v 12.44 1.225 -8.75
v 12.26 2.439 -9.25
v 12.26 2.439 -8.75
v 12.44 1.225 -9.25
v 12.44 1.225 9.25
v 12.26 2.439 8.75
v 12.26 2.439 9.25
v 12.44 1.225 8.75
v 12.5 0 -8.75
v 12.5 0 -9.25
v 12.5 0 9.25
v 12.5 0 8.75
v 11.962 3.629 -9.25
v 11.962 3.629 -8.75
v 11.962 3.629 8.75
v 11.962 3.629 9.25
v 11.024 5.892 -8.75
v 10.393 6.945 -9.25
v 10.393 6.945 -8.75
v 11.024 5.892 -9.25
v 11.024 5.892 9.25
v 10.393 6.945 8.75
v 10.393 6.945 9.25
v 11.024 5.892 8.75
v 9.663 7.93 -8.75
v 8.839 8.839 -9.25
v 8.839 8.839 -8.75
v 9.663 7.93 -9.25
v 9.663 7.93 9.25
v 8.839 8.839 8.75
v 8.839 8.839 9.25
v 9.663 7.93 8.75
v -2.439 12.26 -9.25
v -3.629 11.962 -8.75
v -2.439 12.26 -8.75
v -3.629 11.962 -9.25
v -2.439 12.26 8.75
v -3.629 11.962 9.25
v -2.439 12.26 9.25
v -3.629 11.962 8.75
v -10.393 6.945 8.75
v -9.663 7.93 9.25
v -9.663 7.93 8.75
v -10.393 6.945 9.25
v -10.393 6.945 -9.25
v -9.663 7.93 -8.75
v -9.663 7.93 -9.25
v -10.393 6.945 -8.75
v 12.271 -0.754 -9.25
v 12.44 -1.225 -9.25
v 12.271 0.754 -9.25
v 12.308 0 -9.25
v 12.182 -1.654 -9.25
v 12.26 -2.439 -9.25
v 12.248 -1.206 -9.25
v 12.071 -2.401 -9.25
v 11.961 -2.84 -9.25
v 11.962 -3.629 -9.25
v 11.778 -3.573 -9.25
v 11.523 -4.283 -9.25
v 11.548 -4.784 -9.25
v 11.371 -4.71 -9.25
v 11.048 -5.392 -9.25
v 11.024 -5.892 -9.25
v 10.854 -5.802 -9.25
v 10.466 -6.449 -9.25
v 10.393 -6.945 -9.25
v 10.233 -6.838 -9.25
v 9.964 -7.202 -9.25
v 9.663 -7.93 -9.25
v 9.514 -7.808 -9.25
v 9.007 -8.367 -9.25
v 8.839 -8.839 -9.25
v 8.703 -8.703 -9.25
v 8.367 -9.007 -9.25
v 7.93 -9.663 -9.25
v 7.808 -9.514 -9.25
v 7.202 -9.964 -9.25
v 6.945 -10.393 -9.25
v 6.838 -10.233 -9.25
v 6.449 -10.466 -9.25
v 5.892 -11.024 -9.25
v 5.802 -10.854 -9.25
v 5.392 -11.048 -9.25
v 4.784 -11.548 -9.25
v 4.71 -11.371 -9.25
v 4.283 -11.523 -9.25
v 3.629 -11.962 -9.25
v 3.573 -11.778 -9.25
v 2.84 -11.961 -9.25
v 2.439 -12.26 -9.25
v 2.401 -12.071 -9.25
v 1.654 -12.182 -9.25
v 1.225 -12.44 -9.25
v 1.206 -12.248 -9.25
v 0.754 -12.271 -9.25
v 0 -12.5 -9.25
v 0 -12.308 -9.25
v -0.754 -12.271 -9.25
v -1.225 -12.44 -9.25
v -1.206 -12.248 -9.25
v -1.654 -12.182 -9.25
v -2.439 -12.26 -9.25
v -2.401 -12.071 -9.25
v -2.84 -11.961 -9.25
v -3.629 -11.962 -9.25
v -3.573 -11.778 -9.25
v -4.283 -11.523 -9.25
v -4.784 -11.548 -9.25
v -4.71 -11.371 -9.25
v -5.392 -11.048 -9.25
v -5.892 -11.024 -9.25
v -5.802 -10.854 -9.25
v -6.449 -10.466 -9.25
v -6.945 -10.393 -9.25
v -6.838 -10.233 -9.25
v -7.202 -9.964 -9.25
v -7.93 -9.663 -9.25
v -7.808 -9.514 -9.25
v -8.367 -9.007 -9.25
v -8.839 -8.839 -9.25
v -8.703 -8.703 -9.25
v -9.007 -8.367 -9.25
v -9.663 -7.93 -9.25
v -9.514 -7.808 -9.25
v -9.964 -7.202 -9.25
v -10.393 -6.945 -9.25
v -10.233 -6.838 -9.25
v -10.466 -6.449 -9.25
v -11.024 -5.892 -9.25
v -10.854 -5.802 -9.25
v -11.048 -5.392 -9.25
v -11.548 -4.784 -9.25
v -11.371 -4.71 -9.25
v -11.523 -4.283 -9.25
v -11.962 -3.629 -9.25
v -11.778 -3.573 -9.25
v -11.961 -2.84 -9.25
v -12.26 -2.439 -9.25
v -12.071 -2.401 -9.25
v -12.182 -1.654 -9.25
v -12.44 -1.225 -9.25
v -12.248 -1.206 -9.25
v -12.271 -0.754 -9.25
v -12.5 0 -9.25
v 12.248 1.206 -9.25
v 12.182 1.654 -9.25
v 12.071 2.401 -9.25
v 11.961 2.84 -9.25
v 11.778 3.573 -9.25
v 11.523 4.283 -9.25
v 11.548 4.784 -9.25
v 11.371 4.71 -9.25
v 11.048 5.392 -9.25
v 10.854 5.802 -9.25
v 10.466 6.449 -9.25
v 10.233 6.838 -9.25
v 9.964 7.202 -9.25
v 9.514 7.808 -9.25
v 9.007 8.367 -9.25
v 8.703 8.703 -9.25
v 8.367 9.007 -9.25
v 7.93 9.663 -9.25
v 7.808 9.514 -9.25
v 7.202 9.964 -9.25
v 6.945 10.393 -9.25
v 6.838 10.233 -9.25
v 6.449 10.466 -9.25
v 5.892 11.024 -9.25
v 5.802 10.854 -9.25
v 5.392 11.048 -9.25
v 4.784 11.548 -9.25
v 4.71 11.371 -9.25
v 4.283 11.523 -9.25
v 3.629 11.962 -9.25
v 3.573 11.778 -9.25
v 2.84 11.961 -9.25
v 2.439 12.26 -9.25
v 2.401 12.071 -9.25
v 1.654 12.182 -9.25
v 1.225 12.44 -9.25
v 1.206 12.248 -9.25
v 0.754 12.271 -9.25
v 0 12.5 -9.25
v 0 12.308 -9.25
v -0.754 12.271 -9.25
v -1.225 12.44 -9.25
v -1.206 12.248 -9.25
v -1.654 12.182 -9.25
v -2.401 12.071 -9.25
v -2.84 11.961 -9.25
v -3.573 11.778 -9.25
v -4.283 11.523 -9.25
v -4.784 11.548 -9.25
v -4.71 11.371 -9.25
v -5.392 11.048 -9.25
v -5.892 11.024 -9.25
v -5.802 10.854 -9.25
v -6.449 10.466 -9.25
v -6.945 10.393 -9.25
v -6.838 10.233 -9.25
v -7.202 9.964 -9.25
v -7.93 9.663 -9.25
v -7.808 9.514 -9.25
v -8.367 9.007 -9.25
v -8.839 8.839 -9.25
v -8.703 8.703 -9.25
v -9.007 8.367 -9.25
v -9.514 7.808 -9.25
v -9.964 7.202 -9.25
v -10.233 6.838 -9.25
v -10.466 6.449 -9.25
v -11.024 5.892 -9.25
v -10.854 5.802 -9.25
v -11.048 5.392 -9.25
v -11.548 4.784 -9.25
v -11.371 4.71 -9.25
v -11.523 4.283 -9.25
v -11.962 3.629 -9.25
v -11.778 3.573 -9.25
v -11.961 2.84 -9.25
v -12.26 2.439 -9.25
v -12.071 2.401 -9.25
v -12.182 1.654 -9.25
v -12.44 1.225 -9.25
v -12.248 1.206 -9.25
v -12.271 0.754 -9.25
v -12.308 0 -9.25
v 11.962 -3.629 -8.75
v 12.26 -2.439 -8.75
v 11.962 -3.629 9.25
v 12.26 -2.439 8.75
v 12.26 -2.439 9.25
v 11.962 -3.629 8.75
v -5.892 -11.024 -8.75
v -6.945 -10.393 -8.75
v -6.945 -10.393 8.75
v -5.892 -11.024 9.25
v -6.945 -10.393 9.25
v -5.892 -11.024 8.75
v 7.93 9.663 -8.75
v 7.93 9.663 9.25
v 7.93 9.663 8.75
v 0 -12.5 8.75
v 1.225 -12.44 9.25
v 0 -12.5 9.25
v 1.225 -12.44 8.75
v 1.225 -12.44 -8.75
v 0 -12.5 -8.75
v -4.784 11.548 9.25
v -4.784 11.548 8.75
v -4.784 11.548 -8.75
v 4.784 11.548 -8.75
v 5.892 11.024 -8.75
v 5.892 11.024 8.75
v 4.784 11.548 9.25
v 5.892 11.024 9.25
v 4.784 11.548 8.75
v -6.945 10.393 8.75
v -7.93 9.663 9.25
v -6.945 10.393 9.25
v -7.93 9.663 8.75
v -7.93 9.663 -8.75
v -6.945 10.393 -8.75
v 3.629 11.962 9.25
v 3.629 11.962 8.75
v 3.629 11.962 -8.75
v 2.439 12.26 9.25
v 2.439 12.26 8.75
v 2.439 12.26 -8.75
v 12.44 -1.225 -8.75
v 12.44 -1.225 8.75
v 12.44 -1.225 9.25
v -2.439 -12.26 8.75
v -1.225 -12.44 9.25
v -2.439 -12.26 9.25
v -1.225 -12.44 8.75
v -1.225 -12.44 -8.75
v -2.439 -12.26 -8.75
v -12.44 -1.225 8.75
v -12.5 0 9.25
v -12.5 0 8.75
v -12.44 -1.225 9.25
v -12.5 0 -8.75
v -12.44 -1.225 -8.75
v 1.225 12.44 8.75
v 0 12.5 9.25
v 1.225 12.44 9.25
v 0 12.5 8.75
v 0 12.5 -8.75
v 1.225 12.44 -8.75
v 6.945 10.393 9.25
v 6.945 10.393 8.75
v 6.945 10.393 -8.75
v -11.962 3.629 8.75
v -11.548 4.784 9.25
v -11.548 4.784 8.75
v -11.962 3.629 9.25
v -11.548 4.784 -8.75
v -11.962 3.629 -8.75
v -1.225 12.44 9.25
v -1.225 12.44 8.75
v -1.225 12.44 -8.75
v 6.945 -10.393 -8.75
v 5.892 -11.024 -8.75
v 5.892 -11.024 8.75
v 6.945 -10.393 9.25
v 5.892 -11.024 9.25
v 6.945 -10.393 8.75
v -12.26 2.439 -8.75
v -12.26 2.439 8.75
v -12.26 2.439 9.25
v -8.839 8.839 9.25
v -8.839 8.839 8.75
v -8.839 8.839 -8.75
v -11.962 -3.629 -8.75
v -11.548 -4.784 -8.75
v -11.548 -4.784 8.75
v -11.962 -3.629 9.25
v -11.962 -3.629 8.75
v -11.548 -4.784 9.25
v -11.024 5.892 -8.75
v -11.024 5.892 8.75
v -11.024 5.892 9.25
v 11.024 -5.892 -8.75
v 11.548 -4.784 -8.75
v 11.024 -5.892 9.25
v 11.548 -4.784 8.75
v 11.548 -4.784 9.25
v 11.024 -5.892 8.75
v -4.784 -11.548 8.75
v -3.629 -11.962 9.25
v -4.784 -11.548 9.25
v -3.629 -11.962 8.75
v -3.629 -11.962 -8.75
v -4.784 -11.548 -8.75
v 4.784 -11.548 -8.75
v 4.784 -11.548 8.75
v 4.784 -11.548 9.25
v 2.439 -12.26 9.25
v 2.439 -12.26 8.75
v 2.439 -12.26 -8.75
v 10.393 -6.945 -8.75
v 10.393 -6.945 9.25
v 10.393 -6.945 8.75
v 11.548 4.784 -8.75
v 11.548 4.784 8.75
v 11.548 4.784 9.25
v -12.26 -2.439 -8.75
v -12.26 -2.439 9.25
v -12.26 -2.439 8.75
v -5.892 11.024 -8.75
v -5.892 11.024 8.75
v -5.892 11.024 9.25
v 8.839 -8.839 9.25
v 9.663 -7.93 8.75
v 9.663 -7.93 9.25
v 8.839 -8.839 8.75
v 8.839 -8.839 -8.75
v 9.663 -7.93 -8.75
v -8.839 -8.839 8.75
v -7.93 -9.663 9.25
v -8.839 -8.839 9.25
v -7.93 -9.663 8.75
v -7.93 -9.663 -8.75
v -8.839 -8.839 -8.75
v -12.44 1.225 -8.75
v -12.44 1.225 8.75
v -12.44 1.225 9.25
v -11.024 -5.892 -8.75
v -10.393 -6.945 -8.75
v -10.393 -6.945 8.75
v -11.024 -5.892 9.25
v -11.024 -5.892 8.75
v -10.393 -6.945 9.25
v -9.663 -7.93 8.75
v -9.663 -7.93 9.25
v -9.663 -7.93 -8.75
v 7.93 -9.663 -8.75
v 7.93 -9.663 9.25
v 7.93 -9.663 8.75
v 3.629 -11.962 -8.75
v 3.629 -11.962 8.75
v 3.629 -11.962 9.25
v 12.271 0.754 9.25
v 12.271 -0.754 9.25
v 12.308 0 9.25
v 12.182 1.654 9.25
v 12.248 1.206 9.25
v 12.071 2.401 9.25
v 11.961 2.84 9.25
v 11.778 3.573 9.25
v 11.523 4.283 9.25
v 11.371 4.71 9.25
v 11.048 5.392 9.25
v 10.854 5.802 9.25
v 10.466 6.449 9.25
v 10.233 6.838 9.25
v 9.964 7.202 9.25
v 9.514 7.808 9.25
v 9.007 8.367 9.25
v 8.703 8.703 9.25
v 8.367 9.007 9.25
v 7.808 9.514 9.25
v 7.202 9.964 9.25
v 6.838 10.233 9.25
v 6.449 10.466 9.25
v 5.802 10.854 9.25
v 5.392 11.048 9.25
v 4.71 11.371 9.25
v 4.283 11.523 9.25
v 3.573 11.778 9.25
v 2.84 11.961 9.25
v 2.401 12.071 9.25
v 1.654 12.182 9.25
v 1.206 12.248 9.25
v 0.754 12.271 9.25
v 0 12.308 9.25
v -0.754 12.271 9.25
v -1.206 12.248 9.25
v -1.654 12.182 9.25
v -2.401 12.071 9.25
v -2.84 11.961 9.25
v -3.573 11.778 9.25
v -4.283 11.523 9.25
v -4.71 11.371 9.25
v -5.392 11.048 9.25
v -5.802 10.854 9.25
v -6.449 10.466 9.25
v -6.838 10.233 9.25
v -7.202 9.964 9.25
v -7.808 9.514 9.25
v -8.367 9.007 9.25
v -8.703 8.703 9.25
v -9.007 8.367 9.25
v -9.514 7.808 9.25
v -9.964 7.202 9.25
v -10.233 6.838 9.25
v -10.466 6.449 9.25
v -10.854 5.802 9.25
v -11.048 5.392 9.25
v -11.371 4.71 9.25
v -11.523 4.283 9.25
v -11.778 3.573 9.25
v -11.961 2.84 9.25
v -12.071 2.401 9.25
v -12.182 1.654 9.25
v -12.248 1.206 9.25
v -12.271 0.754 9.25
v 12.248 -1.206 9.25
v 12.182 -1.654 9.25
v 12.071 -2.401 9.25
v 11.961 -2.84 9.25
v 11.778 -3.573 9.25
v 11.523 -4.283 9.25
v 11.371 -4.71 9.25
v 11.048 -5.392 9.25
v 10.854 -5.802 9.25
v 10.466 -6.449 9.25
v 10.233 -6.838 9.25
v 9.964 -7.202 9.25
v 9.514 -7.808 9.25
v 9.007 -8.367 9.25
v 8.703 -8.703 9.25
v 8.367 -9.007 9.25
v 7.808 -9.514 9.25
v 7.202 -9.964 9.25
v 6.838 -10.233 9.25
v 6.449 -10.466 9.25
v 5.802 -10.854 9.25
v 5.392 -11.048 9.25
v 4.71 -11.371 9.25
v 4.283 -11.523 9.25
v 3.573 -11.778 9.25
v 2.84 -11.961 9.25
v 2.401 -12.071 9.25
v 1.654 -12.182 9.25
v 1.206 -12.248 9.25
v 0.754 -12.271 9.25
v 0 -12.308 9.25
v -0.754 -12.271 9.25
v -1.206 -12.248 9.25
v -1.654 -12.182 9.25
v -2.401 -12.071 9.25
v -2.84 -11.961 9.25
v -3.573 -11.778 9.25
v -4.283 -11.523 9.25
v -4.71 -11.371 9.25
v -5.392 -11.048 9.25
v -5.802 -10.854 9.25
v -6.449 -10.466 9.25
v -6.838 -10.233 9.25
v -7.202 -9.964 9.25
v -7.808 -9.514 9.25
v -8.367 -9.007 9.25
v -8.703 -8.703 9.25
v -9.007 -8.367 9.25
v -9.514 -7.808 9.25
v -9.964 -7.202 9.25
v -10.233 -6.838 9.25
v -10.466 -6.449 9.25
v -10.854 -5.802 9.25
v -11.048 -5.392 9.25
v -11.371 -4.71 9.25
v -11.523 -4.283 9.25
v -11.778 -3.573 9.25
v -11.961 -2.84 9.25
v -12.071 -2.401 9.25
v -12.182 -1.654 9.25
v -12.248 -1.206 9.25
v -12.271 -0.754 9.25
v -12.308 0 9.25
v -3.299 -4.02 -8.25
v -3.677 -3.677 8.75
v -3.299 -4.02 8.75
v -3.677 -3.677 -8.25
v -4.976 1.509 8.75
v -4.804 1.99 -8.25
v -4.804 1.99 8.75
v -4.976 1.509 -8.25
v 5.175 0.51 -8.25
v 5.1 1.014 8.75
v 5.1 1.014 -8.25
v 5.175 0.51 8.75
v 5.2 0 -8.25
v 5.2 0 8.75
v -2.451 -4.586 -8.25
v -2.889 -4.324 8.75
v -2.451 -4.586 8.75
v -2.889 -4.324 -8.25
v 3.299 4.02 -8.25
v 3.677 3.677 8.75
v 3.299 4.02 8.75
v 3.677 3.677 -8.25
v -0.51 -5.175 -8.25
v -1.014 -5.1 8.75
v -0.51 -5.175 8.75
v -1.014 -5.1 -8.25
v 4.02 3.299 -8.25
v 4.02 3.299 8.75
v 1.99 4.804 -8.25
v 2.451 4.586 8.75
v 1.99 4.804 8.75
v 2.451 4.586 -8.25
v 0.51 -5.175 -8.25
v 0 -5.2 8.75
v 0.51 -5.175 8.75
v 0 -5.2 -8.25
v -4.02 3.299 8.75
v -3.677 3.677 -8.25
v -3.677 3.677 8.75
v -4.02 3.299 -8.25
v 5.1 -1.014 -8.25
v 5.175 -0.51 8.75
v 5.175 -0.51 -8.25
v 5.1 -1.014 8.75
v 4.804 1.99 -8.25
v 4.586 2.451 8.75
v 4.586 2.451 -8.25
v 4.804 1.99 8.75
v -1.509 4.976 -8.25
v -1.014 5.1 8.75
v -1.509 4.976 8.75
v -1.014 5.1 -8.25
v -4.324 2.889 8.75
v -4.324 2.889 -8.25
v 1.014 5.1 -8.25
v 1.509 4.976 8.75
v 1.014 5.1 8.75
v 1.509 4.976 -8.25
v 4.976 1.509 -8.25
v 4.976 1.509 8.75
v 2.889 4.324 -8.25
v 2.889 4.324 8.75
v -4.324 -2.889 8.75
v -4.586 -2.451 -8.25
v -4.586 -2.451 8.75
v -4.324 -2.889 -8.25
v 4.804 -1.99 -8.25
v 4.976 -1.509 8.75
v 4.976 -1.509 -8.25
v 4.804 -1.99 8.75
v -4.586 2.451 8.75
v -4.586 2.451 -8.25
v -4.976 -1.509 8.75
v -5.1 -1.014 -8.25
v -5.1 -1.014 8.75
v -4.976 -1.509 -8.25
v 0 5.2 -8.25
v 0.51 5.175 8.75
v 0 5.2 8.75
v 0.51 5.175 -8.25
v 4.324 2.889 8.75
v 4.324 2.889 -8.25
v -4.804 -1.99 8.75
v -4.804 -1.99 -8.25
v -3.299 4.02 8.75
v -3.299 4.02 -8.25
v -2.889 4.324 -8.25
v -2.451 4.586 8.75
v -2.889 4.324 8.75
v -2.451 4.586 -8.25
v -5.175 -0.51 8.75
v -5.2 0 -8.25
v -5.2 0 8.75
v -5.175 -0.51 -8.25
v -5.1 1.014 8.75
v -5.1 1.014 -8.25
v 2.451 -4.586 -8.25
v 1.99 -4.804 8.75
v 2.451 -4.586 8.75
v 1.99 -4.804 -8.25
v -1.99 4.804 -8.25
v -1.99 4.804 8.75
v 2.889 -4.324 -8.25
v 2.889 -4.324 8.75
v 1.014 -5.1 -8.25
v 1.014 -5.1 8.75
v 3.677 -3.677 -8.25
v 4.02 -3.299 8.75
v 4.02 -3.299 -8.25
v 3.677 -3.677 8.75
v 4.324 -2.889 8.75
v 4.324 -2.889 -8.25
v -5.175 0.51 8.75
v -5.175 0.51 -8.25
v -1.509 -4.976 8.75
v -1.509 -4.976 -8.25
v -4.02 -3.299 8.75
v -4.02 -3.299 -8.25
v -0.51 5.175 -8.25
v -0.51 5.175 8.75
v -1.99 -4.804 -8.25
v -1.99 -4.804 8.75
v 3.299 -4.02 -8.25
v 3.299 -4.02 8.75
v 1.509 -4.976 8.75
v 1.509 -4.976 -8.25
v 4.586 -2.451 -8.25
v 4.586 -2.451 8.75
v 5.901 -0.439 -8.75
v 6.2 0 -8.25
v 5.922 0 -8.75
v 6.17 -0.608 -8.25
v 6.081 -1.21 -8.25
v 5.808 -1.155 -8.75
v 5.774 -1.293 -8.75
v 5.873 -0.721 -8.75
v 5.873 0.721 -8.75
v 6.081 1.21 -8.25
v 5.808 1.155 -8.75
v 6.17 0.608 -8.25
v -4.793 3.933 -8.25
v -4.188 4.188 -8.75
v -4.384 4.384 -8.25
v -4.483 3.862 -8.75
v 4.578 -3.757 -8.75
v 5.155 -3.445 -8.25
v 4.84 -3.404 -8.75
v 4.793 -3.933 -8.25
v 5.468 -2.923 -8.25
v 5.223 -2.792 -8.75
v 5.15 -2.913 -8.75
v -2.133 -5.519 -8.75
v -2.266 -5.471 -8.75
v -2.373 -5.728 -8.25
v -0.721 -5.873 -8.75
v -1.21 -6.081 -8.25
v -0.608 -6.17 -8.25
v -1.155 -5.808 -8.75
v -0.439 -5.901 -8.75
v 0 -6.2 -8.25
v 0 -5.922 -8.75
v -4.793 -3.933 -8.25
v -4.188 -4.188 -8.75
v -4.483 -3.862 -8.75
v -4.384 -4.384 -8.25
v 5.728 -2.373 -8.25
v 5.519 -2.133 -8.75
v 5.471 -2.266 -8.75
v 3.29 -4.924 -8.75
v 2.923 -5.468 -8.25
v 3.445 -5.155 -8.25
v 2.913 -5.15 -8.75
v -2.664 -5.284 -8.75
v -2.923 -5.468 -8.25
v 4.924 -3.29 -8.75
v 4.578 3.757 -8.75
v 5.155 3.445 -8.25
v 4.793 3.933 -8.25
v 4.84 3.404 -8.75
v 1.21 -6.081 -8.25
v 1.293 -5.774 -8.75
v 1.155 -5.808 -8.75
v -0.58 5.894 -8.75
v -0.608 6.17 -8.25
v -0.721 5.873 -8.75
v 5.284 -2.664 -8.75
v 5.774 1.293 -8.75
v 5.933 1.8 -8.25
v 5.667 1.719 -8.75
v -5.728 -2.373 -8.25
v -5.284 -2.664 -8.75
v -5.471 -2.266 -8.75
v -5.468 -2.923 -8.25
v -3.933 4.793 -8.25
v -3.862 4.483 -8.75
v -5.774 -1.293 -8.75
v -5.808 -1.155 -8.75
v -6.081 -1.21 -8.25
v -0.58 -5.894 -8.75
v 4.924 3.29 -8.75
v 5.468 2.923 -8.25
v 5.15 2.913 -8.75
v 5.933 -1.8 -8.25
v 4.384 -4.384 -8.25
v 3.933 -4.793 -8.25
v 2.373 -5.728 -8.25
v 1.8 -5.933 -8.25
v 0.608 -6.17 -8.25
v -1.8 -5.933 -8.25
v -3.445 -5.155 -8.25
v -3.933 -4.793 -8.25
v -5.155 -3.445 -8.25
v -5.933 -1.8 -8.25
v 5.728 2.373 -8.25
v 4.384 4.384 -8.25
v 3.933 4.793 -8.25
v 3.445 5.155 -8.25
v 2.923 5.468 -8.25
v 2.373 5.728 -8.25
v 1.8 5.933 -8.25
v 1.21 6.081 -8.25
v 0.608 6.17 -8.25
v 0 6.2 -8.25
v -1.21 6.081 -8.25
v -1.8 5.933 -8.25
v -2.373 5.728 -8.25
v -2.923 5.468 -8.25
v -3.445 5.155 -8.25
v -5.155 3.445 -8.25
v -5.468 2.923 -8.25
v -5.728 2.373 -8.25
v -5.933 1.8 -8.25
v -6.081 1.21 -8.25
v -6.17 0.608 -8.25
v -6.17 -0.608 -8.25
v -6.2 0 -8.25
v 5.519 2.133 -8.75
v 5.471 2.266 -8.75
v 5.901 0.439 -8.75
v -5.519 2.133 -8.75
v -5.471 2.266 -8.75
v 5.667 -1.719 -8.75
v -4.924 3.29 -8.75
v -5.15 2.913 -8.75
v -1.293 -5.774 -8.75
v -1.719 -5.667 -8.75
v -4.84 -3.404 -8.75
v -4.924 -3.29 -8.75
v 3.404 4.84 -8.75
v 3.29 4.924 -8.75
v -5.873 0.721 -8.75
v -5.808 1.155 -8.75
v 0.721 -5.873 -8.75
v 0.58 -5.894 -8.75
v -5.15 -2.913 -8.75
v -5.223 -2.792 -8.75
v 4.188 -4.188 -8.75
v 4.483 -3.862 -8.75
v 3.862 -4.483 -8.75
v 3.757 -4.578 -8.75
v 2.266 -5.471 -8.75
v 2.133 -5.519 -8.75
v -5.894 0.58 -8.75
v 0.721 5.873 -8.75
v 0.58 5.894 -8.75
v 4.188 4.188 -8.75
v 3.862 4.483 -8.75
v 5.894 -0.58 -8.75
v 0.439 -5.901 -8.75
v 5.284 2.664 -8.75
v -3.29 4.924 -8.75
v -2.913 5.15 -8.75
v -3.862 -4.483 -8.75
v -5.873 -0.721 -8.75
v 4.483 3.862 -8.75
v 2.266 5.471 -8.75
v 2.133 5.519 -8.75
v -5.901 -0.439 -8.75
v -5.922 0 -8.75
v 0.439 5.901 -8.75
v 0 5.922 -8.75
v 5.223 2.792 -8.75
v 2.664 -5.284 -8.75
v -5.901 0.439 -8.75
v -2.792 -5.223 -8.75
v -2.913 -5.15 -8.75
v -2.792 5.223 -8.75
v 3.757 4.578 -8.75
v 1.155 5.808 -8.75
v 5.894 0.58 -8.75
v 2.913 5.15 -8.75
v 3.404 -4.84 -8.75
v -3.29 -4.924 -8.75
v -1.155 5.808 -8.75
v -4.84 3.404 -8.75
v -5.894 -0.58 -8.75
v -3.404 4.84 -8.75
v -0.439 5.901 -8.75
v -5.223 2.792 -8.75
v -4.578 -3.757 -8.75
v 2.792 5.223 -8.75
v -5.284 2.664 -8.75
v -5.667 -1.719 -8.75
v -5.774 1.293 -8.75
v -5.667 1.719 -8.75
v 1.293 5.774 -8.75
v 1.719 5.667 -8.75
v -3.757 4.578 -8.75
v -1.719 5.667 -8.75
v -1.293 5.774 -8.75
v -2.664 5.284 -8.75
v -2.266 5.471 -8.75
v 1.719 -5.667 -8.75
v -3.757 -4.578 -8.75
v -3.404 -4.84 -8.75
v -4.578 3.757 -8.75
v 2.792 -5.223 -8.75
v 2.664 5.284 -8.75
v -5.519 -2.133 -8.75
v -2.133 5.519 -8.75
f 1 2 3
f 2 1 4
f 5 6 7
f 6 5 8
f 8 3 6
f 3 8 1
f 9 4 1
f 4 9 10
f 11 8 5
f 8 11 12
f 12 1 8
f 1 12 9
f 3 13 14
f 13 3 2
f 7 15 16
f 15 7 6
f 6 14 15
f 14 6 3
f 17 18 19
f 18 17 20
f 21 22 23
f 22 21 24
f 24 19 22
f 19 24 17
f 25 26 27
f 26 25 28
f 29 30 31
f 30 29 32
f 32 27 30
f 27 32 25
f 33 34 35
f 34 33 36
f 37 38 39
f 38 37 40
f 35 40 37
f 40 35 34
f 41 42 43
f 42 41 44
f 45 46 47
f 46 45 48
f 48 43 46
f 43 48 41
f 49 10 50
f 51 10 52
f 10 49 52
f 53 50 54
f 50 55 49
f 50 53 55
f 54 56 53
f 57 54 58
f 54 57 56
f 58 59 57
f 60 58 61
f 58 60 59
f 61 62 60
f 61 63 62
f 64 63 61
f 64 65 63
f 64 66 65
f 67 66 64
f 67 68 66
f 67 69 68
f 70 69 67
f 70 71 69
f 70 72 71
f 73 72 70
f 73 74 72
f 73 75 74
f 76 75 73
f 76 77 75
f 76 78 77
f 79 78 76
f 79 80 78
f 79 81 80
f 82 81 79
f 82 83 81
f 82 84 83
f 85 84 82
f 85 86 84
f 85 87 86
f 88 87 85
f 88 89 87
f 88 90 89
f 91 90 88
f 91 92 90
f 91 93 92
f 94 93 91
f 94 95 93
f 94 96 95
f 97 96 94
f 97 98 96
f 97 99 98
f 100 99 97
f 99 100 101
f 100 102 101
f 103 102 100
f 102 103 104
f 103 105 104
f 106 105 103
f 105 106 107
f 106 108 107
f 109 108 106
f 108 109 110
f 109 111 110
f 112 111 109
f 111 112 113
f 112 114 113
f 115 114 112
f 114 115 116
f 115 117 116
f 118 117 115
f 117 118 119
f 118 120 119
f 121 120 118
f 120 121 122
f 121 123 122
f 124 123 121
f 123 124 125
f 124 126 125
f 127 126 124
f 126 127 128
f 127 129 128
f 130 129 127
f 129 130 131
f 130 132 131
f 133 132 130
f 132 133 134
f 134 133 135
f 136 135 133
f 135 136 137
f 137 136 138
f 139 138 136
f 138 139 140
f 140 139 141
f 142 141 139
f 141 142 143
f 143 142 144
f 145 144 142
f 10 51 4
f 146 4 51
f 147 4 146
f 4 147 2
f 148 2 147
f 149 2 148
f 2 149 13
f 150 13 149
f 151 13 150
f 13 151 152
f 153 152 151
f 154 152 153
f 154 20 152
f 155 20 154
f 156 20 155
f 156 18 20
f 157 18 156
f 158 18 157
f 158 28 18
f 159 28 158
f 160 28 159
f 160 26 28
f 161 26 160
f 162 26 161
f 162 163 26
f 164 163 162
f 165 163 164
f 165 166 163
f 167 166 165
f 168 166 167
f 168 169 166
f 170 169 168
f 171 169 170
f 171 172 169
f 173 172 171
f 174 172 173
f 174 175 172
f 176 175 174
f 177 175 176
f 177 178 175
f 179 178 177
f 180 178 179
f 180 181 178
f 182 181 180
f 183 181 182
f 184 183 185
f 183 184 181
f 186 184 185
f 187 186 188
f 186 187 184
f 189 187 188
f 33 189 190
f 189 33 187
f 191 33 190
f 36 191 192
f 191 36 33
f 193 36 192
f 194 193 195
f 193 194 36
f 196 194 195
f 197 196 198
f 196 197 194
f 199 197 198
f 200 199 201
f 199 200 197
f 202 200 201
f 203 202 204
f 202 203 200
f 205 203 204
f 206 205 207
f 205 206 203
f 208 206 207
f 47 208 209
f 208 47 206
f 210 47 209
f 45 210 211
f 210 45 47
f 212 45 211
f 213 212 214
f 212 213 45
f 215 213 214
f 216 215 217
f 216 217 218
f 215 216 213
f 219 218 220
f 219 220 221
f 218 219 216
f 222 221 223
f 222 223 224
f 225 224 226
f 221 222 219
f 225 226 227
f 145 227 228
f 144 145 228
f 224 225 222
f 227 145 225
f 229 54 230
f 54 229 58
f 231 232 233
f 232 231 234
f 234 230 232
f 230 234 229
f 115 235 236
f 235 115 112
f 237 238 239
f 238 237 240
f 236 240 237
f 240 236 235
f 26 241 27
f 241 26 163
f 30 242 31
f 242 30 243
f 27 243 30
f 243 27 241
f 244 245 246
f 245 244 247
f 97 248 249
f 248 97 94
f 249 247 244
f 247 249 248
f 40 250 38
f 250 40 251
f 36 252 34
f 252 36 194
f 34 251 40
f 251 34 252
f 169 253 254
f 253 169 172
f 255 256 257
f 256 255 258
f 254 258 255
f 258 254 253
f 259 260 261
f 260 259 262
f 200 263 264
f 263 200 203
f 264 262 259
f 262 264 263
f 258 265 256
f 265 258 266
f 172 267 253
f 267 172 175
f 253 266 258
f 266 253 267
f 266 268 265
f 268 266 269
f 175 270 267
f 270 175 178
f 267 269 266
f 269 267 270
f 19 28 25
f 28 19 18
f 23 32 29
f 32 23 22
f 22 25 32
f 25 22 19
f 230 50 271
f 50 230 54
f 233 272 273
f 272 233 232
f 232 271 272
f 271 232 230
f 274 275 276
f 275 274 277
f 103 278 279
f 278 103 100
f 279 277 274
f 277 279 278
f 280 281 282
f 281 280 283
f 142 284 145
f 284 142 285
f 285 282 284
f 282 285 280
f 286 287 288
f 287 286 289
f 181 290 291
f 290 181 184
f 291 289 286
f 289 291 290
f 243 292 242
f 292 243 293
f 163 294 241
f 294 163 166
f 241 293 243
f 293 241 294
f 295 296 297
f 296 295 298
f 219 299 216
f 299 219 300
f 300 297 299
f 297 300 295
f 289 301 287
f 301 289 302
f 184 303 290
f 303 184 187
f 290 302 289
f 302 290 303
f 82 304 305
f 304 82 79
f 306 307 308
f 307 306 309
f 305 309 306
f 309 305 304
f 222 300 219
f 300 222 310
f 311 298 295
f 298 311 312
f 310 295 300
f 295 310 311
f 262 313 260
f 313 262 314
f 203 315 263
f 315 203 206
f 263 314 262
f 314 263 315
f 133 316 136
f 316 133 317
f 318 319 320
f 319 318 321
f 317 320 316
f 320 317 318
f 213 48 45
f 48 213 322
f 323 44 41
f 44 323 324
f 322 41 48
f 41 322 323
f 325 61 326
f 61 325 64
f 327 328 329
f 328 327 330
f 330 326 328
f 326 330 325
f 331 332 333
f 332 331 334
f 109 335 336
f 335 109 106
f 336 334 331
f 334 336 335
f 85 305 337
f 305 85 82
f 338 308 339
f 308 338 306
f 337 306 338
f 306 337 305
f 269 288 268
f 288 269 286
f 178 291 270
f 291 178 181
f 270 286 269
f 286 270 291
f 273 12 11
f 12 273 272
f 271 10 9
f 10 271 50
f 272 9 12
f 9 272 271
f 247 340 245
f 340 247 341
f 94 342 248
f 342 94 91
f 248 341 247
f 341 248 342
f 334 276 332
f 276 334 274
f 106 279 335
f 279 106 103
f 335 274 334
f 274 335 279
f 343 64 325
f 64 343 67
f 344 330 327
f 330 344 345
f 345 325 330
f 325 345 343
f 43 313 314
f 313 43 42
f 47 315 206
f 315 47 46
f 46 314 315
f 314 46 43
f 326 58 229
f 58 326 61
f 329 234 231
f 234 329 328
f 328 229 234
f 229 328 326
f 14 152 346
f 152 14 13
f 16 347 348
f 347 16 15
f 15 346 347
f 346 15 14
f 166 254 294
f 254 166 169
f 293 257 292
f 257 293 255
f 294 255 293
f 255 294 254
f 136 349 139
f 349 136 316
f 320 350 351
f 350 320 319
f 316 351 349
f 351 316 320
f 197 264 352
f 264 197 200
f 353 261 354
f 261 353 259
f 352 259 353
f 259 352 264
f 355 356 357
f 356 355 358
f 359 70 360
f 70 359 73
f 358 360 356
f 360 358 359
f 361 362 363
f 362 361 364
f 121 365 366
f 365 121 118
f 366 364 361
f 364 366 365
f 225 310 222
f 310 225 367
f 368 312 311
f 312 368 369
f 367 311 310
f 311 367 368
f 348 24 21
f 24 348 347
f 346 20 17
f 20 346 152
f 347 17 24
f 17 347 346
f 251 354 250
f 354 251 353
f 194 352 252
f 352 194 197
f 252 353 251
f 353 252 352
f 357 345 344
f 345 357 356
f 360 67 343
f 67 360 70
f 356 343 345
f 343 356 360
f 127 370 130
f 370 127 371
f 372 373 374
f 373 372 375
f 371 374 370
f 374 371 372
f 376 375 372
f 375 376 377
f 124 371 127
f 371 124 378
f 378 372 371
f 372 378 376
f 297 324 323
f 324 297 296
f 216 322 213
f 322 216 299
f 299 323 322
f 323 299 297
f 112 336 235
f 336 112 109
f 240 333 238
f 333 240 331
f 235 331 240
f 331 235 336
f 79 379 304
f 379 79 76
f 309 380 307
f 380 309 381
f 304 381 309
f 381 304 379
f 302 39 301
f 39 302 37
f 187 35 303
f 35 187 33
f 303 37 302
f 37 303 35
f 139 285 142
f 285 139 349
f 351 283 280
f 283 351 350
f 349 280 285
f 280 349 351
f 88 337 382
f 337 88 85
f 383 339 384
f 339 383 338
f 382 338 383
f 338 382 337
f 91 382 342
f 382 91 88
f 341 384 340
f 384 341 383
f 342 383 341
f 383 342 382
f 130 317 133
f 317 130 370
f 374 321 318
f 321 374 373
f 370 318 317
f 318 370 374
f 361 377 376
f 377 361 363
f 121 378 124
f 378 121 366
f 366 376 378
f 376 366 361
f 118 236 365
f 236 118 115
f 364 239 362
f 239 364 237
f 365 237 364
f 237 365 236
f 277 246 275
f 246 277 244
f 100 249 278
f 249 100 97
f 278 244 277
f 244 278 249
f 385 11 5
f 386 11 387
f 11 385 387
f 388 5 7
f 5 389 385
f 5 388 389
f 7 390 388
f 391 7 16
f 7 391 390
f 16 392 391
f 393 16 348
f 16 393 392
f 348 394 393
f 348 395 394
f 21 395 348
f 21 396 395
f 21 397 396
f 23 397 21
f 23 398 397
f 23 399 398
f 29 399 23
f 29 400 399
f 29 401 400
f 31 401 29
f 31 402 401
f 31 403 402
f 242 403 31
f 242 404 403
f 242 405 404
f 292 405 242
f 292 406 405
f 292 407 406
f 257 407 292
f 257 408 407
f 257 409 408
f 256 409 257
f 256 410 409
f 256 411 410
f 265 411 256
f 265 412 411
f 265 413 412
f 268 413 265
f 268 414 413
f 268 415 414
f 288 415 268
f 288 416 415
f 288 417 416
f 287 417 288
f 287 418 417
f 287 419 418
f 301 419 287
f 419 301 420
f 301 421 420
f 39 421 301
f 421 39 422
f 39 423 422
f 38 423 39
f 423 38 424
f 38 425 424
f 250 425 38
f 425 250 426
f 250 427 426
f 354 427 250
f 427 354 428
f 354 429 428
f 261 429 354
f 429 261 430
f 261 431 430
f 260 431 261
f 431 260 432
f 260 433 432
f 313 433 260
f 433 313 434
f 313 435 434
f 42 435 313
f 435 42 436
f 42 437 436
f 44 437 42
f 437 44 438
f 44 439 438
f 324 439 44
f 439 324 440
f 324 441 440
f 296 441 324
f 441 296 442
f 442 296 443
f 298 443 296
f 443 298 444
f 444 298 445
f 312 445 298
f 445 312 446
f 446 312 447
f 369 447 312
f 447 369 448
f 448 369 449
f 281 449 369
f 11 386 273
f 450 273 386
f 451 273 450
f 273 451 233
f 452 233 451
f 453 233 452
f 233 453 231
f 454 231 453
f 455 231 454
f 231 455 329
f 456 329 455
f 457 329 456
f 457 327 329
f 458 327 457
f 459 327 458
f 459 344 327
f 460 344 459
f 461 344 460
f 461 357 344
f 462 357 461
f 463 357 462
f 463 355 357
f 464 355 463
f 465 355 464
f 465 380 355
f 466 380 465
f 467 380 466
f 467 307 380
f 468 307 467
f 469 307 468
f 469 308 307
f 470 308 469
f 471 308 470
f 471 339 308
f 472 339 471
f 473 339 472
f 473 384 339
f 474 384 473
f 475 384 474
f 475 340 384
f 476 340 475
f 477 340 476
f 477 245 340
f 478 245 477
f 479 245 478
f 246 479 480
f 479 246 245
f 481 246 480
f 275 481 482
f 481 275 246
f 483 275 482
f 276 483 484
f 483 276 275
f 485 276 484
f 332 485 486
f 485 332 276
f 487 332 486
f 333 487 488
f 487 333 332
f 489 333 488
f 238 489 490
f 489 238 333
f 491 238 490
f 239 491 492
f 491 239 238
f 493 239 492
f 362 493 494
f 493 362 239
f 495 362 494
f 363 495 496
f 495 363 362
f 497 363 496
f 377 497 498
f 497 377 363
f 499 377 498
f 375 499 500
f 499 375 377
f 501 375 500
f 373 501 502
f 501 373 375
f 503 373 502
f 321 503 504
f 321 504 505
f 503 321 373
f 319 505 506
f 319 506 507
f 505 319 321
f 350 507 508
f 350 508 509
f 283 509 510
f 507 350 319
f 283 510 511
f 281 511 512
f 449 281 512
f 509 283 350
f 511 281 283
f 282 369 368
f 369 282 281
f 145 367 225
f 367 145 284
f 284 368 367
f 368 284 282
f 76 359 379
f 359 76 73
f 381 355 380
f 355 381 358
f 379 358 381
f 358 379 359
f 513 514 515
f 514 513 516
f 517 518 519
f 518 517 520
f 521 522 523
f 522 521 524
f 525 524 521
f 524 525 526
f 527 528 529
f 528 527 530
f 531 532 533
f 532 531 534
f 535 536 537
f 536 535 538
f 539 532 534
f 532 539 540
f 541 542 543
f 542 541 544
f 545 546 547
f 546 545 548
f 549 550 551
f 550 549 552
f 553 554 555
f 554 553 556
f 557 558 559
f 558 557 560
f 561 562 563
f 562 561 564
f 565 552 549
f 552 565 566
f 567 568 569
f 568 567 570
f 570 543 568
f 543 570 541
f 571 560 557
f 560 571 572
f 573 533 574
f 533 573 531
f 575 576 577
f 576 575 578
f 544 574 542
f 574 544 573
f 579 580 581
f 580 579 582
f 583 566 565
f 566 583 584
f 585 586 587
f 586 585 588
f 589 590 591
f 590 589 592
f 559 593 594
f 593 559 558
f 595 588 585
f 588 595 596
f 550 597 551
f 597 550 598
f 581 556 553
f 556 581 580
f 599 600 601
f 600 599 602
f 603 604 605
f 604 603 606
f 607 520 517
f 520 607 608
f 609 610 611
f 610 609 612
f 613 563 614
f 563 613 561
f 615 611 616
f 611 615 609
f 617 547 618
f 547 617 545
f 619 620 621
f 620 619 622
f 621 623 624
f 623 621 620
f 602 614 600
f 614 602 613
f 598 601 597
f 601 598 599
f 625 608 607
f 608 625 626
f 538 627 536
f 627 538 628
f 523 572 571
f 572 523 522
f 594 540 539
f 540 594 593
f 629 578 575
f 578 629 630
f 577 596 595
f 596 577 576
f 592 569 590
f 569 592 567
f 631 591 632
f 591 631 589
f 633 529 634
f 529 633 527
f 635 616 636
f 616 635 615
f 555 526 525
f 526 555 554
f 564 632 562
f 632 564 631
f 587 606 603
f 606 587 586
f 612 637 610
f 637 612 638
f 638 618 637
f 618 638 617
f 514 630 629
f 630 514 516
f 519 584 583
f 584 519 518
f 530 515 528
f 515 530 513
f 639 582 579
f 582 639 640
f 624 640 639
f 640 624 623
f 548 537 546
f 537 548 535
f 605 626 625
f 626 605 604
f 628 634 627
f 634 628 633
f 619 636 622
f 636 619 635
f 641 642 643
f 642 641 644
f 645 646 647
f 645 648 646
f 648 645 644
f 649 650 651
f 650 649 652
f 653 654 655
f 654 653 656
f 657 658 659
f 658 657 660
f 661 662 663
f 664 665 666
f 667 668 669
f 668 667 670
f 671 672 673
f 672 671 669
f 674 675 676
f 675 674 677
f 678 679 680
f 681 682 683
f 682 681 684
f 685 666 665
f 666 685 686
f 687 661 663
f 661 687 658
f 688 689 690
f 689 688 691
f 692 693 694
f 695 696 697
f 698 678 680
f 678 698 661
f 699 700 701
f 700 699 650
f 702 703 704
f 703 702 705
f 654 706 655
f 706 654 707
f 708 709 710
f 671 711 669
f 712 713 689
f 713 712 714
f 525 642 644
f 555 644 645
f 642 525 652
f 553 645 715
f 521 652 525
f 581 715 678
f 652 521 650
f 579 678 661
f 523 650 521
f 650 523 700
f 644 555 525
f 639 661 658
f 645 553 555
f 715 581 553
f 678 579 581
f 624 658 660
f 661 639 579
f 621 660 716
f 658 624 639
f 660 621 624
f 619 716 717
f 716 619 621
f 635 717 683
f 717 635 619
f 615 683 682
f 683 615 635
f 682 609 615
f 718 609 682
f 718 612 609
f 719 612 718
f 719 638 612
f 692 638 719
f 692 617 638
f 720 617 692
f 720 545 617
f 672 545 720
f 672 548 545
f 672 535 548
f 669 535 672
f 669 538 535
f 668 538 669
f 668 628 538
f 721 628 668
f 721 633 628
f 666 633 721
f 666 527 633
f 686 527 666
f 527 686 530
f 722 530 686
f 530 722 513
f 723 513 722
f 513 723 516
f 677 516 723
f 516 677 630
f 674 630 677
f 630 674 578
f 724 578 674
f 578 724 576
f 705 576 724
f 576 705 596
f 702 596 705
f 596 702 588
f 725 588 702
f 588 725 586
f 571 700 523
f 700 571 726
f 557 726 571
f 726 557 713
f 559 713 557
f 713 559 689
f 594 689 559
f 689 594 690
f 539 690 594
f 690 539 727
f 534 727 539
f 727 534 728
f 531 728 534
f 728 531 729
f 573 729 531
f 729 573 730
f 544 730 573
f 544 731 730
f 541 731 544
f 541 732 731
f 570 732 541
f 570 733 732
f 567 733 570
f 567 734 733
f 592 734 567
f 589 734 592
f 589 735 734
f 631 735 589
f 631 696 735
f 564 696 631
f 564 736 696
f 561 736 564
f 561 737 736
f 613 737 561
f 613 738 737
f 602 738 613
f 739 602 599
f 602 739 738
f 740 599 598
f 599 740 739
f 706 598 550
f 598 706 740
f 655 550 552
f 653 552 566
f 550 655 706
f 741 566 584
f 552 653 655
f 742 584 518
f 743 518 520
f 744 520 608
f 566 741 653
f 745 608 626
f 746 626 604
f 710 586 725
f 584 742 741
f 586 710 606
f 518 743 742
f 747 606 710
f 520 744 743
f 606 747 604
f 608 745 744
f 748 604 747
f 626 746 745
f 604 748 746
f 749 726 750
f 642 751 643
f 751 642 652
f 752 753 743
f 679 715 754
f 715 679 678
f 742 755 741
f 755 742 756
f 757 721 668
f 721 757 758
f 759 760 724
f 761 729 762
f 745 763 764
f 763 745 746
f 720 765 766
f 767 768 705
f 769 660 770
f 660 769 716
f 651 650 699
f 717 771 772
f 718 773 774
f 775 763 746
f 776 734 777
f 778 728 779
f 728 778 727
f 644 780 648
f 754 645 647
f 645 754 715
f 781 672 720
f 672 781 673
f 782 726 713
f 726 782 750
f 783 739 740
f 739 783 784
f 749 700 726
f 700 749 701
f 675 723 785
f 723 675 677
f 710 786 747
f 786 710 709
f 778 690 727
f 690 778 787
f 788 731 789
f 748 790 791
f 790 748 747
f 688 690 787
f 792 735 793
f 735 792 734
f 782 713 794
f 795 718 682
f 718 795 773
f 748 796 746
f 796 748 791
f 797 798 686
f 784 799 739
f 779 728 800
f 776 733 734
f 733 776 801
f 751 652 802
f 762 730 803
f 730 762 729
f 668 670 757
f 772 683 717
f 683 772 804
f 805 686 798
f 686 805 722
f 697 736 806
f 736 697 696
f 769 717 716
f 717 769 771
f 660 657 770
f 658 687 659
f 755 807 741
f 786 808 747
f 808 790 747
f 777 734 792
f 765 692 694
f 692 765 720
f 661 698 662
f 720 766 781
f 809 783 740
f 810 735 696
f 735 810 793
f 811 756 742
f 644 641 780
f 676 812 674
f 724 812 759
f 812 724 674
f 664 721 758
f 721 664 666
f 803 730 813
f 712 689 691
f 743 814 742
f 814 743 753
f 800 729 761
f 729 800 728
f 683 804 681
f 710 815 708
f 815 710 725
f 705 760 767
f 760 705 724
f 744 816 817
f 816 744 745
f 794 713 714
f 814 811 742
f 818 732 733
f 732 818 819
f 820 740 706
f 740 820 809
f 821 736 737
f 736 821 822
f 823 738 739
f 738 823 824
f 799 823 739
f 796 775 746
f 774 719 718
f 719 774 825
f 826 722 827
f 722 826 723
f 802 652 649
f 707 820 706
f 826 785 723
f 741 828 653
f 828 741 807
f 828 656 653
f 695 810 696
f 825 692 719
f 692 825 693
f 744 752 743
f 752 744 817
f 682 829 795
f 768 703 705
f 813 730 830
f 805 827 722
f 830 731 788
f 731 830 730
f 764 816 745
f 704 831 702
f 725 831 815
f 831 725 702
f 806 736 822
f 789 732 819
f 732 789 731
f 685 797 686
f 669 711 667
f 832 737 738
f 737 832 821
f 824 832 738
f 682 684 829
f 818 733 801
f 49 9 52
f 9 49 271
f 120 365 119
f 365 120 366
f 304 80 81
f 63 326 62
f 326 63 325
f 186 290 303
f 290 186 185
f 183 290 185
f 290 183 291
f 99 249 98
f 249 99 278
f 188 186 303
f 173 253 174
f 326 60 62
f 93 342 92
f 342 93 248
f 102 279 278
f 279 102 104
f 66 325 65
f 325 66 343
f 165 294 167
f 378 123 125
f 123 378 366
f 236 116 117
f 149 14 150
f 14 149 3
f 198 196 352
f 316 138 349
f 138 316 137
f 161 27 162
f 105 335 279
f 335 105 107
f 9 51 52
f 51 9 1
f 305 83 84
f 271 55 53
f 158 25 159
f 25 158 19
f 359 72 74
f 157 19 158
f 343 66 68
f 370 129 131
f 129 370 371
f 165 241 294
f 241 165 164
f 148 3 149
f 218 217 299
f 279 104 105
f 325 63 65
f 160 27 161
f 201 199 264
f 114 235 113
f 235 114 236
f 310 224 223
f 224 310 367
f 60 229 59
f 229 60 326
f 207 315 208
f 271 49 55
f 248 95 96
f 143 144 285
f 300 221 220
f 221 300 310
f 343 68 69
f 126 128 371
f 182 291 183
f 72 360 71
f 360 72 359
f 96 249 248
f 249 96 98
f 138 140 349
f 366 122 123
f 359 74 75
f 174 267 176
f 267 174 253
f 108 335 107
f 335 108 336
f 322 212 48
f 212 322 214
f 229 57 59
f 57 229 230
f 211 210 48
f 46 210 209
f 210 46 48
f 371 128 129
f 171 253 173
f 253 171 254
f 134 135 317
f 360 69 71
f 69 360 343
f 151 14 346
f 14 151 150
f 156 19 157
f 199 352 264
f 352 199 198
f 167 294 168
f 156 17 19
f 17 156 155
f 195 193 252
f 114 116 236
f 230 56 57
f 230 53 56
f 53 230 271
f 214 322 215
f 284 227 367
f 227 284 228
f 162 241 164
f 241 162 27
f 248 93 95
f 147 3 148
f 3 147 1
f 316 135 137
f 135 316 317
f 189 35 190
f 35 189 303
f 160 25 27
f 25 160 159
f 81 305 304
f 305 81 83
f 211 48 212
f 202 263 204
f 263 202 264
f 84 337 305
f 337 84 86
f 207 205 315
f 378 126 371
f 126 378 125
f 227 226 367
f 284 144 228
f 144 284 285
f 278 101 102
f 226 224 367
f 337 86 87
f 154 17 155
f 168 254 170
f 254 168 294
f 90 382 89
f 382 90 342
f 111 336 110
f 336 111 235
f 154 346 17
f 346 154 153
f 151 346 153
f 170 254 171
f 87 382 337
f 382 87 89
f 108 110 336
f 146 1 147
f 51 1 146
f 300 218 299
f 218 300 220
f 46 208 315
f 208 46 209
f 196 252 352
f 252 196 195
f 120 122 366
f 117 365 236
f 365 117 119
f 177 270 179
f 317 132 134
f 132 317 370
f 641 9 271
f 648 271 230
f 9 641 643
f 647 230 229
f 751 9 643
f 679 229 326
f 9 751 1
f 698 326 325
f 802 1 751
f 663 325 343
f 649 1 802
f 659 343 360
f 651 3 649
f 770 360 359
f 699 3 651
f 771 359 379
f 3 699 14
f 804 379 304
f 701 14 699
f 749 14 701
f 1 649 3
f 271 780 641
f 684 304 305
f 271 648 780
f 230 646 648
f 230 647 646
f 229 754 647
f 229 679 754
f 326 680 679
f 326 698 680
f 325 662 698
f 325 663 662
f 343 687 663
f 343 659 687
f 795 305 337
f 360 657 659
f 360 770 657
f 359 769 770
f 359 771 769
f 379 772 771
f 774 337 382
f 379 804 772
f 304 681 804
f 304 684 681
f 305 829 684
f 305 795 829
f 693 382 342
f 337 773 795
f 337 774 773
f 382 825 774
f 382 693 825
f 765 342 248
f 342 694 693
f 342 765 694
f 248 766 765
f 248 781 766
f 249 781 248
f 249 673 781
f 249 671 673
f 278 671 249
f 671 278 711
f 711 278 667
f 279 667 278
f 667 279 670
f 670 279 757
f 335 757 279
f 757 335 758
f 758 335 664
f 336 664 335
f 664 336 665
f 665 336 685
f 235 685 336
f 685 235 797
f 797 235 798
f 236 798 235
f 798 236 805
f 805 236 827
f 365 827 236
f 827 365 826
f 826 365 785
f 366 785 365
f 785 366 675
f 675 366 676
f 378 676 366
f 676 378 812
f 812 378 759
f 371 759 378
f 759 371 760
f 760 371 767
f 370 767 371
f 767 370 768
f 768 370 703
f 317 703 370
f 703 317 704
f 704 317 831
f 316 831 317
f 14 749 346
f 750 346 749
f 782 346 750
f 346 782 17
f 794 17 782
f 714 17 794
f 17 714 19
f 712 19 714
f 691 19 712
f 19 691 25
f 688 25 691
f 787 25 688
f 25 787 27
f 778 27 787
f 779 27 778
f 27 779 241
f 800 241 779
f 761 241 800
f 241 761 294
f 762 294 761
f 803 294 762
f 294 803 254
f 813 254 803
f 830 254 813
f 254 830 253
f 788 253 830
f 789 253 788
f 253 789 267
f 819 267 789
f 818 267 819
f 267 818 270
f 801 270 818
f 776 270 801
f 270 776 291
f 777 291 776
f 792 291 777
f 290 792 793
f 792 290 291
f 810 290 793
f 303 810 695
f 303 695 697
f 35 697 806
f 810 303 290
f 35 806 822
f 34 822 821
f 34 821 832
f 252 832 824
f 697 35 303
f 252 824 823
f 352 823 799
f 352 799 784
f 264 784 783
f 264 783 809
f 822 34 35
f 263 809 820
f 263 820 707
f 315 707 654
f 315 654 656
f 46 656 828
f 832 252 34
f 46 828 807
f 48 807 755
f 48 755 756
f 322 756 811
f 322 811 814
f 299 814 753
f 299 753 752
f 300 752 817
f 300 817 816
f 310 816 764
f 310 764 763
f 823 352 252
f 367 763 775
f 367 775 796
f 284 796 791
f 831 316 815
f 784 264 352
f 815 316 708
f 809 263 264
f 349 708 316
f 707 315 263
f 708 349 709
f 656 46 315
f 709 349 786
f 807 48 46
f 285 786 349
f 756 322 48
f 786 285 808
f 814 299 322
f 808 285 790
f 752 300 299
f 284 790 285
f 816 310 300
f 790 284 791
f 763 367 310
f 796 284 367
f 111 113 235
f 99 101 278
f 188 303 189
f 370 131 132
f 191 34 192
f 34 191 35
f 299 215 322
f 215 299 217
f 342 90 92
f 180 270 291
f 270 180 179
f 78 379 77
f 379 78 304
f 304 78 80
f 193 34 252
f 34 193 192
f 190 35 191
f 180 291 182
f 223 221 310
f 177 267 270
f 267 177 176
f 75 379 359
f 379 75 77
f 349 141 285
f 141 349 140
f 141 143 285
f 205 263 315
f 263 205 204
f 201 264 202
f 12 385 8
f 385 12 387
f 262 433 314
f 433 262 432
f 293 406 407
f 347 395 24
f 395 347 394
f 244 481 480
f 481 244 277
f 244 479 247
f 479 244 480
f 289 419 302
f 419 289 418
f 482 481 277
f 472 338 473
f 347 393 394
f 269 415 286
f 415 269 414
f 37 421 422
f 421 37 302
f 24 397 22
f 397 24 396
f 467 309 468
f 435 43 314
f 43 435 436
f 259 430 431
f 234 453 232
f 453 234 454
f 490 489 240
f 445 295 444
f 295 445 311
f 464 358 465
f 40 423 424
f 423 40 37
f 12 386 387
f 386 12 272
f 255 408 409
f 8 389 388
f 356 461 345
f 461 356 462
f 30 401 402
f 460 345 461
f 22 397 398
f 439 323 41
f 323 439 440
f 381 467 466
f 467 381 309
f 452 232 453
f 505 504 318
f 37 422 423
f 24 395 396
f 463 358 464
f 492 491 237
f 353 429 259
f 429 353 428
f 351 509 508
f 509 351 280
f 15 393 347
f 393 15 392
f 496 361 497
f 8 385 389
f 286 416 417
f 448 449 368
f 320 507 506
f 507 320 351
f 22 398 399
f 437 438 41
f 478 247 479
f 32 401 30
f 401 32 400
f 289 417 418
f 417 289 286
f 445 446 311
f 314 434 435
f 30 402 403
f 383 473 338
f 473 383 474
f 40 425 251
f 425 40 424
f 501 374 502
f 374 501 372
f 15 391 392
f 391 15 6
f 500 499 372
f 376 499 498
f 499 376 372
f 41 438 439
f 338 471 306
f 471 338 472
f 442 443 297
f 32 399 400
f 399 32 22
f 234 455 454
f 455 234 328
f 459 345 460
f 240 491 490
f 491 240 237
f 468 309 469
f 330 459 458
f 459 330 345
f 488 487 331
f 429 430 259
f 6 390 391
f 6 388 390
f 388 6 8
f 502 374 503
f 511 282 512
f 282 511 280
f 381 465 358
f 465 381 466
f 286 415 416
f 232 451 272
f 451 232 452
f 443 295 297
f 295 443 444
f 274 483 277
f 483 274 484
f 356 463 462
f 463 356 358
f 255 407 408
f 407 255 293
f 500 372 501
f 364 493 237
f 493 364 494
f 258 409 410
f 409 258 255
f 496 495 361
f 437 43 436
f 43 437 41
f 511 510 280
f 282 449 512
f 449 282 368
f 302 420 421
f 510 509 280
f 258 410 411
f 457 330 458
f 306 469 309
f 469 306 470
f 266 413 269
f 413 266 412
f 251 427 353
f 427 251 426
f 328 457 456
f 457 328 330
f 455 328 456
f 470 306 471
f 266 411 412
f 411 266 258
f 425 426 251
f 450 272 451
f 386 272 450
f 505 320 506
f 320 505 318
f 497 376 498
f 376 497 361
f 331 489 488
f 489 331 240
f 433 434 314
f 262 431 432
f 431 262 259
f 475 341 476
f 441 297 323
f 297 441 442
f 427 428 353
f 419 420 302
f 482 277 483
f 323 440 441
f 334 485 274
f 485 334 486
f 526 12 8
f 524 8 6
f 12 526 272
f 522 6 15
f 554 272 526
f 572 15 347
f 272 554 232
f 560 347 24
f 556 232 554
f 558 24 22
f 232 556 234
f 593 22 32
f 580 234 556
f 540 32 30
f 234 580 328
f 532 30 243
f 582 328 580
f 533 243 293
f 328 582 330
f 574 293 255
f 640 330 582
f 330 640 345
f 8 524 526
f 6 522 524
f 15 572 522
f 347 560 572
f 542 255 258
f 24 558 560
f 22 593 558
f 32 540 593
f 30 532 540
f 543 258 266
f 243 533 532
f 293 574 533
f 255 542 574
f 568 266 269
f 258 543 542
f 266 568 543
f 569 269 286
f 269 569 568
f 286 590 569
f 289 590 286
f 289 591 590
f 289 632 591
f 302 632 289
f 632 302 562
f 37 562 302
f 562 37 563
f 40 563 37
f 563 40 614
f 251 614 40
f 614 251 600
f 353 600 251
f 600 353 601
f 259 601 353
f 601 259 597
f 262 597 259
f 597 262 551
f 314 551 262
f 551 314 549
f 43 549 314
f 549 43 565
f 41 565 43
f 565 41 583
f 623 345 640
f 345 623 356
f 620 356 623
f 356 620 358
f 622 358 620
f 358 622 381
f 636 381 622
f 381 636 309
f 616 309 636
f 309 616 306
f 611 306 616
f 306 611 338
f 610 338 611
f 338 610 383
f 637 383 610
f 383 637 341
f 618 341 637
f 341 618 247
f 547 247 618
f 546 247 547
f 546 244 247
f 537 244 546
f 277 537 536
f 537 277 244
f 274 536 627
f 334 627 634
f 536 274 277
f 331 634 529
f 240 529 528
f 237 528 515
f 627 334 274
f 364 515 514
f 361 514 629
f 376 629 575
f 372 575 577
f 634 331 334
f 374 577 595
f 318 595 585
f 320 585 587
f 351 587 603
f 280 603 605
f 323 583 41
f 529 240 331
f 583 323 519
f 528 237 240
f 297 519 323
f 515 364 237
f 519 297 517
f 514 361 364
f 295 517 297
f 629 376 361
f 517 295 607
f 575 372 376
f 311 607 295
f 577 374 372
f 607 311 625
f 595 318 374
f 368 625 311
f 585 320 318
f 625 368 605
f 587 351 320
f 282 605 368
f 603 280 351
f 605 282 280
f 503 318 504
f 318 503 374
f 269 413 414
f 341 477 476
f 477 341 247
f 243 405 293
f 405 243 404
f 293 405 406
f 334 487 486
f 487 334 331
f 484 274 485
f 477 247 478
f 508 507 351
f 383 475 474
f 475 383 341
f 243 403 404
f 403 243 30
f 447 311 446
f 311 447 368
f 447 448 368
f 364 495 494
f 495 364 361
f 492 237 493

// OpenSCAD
// Parameters
outer_diameter_mm = 25.0; //[12.5:50.0:0.1]
length_mm = 18.5; //[9.25:37.0:0.1]
screw_nominal_diameter_mm = 10.0; //[5.0:20.0:0.1]
internal_thread_pitch_mm = 1.5; //[0.5:3.0:0.1]
thread_clearance_mm = 0.4; //[0.0:1.0:0.05]
top_chamfer_mm = 0.5; //[0.0:2.0:0.1]
bottom_chamfer_mm = 0.5; //[0.0:2.0:0.1]
thread_start_lead_in_mm = 1.0; //[0.0:4.0:0.1]
overlap_mm = 0.8; //[0.2:2.0:0.1]

// Threaded Insert - complete geometry
module threaded_insert() {
  color("Brass") {
    difference() {
      // Insert body
      cylinder(r=outer_diameter_mm/2, h=length_mm, center=true, $fn=64);
      
      // Internal thread bore
      cylinder(r=(screw_nominal_diameter_mm + thread_clearance_mm)/2, 
               h=length_mm + 2*overlap_mm, center=true, $fn=64);
      
      // Lead-in chamfer
      translate([0, 0, -length_mm/2 + (thread_start_lead_in_mm + overlap_mm)/2 - overlap_mm])
        rotate([180, 0, 0])
        cylinder(r1=(screw_nominal_diameter_mm + thread_clearance_mm)/2 + thread_start_lead_in_mm, 
                 r2=(screw_nominal_diameter_mm + thread_clearance_mm)/2, 
                 h=thread_start_lead_in_mm + overlap_mm, center=true, $fn=64);
      
      // Installation end chamfer
      translate([0, 0, -length_mm/2 + (bottom_chamfer_mm + overlap_mm)/2 - overlap_mm])
        rotate([180, 0, 0])
        cylinder(r1=outer_diameter_mm/2, r2=outer_diameter_mm/2 - bottom_chamfer_mm, 
                 h=bottom_chamfer_mm + overlap_mm, center=true, $fn=64);
      
      // Top end chamfer
      translate([0, 0, length_mm/2 - (top_chamfer_mm + overlap_mm)/2 + overlap_mm])
        cylinder(r1=outer_diameter_mm/2, r2=outer_diameter_mm/2 - top_chamfer_mm, 
                 h=top_chamfer_mm + overlap_mm, center=true, $fn=64);
    }
  }
}

// Assembly
module assembly() {
  threaded_insert();
}

assembly();
